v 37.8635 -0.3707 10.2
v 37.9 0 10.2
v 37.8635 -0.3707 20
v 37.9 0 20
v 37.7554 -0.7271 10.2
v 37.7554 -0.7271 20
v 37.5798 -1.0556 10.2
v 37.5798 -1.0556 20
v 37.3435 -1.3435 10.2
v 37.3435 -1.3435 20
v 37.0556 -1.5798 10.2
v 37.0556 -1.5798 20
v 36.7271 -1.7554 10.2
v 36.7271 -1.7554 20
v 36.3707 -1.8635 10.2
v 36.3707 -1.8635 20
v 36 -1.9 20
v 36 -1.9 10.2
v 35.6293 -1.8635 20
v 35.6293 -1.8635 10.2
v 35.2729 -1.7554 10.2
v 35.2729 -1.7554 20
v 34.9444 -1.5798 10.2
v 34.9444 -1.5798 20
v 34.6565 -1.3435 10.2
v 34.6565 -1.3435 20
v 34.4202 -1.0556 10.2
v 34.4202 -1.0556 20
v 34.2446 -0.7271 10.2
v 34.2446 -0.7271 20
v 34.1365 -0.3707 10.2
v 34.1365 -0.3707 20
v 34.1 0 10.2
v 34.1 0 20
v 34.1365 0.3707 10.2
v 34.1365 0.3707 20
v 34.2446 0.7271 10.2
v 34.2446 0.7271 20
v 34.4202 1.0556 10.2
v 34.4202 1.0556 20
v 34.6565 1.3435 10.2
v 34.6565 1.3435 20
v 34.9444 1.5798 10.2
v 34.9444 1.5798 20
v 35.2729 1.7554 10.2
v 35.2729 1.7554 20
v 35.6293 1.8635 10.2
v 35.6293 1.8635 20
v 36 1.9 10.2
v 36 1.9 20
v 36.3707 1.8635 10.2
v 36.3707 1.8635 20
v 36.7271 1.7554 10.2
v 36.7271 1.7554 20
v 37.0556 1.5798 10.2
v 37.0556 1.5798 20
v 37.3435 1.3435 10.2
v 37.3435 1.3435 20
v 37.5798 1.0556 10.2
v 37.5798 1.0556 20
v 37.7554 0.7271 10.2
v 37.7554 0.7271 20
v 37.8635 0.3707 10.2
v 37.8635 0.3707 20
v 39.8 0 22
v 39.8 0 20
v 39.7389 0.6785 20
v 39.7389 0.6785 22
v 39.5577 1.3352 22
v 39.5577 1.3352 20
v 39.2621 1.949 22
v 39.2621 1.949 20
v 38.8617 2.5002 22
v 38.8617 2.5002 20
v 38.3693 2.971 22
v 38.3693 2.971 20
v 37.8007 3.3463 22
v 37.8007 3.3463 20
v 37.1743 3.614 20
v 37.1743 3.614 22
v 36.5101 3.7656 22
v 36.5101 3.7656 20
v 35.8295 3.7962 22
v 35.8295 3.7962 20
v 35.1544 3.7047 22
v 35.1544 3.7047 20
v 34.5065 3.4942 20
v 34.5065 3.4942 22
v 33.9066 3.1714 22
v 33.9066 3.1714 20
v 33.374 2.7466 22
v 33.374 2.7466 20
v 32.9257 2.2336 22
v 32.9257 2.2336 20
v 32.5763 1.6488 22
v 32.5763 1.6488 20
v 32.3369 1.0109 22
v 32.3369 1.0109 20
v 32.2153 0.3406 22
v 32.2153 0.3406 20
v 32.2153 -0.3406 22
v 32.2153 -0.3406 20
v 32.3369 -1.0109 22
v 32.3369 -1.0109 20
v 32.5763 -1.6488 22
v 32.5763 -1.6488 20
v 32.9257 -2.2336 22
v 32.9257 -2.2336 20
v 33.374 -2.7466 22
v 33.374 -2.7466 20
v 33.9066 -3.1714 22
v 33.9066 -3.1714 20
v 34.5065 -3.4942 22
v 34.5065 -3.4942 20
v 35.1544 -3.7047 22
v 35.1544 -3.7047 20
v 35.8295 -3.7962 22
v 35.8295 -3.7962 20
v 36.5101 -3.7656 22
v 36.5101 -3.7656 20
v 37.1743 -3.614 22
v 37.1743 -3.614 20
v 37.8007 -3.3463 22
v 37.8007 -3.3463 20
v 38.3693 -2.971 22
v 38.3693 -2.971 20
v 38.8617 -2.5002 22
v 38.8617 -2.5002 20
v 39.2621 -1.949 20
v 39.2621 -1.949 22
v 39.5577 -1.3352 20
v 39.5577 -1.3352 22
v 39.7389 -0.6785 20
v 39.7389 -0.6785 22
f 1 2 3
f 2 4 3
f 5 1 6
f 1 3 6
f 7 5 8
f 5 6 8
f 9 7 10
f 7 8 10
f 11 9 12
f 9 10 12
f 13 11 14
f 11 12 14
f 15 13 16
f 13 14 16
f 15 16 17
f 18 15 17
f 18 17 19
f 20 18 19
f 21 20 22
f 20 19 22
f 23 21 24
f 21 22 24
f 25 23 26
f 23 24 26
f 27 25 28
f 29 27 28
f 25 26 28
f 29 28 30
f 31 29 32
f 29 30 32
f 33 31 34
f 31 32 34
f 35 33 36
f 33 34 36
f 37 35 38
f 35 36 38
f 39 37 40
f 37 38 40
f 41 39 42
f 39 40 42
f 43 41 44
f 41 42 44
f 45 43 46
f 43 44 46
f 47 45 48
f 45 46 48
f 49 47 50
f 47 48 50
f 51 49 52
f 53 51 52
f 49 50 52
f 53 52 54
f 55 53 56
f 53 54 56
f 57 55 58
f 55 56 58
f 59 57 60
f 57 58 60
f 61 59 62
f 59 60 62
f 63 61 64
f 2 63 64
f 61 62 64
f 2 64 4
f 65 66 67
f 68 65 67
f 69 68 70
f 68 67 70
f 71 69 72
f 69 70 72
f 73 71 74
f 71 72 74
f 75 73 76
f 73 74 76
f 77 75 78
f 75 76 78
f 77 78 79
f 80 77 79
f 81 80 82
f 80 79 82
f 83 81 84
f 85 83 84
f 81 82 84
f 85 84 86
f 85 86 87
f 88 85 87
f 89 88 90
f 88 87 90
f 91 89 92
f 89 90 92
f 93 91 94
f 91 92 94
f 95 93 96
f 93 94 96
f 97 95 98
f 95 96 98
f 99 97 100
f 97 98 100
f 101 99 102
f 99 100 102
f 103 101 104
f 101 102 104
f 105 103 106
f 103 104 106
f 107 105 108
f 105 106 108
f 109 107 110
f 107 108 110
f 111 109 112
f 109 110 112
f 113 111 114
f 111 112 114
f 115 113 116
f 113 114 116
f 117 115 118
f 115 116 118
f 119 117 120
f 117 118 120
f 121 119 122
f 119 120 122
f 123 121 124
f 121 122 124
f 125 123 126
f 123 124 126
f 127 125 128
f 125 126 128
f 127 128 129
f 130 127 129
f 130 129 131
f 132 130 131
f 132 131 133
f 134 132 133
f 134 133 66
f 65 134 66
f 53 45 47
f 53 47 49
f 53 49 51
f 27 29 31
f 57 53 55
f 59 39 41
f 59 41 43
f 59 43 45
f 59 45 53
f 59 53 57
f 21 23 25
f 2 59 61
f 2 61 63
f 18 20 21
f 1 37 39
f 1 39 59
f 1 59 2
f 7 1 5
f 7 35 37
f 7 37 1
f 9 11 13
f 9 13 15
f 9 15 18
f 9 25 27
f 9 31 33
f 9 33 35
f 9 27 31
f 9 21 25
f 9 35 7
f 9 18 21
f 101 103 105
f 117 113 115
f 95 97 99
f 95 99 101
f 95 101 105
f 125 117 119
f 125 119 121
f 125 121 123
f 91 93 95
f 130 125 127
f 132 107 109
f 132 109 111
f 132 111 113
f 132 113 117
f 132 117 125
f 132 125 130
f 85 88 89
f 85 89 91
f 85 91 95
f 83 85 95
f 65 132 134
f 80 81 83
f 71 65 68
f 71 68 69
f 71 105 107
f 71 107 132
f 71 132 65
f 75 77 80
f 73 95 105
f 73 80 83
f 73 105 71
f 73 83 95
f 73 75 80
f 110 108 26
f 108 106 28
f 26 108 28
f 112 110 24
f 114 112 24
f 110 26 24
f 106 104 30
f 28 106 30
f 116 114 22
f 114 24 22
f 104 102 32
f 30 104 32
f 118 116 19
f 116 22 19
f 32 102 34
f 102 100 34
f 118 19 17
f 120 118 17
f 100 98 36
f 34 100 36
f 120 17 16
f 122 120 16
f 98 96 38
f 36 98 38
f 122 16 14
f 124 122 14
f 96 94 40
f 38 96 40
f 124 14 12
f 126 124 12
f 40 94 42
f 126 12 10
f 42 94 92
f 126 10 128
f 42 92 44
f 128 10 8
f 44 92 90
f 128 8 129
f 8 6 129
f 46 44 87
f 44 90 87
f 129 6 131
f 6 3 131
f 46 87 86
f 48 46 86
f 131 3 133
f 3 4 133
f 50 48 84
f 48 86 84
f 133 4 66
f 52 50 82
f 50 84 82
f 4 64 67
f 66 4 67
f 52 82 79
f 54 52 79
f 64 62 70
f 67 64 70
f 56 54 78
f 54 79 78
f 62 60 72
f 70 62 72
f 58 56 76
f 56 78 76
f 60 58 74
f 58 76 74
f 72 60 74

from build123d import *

# Parameters (mm, degrees)
SKETCH039_R  = 1.9
PAD015_DEPTH = 6
SKETCH040_R  = 3.8
PAD016_DEPTH = 2
SKETCH049_R  = 1.9
PAD023_DEPTH = 3.8


with BuildPart() as part:
    # Sketch039 (on Face1 of CopyPocket020) → Pad015 (new body)
    with BuildSketch(Plane.XY.offset(14)):
        with Locations((36, 0)):
            Circle(SKETCH039_R)
    extrude(amount=PAD015_DEPTH)

    # Sketch040 (on Face3 of Pad015) → Pad016 (join)
    with BuildSketch(Plane.XY.offset(20)):
        with Locations((36, 0)):
            Circle(SKETCH040_R)
    extrude(amount=PAD016_DEPTH)

    # Sketch049 (on Face1 of Pad016) → Pad023 (join)
    with BuildSketch(Plane(origin=(0, 0, 14), x_dir=(1, 0, 0), z_dir=(0, 0, -1))):
        with Locations((36, 0)):
            Circle(SKETCH049_R)
    extrude(amount=PAD023_DEPTH)


solid = part.part
